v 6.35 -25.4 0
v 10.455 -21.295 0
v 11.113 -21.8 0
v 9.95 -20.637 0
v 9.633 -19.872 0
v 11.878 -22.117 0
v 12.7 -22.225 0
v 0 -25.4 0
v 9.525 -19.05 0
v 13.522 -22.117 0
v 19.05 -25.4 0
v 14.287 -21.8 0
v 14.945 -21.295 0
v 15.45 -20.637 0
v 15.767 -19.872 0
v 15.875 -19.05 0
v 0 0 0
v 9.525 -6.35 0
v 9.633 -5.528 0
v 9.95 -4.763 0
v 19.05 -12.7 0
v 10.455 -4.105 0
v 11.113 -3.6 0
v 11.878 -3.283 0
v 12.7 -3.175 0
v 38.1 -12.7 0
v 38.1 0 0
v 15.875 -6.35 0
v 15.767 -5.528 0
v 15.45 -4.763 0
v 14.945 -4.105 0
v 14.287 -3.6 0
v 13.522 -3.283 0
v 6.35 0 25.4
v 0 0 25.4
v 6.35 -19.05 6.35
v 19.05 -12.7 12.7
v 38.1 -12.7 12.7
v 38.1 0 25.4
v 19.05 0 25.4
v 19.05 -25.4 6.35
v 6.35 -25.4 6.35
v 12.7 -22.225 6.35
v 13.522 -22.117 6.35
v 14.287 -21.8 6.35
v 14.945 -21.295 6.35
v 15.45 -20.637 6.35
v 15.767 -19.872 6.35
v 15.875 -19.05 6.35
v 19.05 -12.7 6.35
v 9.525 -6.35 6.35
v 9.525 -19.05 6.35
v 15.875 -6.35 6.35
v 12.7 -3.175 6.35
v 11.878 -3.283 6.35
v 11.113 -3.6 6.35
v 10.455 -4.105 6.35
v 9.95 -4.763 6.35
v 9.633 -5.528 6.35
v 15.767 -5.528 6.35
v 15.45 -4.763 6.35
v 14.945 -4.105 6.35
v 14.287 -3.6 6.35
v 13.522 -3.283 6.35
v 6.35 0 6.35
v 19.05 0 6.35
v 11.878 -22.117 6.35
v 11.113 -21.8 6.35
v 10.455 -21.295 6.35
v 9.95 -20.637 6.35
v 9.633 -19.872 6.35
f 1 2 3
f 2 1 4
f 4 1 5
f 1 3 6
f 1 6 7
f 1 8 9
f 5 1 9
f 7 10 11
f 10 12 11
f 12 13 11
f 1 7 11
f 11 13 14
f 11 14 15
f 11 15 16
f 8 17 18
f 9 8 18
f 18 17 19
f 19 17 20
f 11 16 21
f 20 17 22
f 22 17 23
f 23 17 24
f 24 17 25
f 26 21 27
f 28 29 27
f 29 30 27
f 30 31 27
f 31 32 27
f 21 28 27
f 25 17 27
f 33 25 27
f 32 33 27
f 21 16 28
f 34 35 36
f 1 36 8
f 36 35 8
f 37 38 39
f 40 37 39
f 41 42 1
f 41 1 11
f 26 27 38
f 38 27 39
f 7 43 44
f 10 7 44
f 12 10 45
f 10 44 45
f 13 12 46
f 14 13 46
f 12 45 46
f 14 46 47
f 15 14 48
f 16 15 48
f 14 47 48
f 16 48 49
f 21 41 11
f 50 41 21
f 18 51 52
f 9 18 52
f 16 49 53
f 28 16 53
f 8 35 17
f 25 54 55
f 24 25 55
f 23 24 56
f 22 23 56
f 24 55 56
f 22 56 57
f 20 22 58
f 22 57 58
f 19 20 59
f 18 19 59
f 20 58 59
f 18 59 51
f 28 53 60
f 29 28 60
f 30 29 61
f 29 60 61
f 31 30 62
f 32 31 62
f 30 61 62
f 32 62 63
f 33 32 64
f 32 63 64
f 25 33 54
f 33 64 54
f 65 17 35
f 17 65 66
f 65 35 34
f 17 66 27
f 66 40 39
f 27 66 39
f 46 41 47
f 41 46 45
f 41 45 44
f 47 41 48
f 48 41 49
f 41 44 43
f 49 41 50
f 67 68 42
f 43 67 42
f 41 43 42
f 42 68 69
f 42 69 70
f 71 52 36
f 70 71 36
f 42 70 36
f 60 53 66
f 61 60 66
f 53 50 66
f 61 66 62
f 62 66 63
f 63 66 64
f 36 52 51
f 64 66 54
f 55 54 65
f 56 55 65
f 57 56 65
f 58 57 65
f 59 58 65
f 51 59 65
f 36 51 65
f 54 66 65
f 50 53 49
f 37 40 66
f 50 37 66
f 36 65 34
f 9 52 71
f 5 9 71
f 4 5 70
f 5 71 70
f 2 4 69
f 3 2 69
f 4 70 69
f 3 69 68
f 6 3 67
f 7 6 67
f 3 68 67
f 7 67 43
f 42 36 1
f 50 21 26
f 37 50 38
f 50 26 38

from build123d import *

# Parameters (mm, degrees)
F1_DEPTH = 25.4
F2_W     = 12.7
F2_H     = 25.4
F3_DEPTH = 19.05
F5_DEPTH = 19.05
F7_DEPTH = 6.35
F9_DEPTH = 25.4


with BuildPart() as f1:
    # F0 (on Front) → F1 (new body)
    with BuildSketch(Plane.XZ):
        Polygon((0, 25.4), (0, 0), (38.1, 0), (38.1, 25.4), (19.05, 25.4), (19.05, 6.35), (6.35, 6.35), (6.35, 25.4), align=None)
    extrude(amount=F1_DEPTH)

    # F2 (on face) → F3 (cut)
    with BuildSketch(Plane.YZ.offset(38.1)):
        with Locations((-19.05, 12.7)):
            Rectangle(F2_W, F2_H)
    extrude(amount=-F3_DEPTH, mode=Mode.SUBTRACT)

    # F4 (on face) → F5 (cut)
    with BuildSketch(Plane.YZ.offset(38.1)):
        Polygon((-12.7, 25.4), (-12.7, 12.7), (0, 25.4), align=None)
    extrude(amount=-F5_DEPTH, mode=Mode.SUBTRACT)

    # F6 (on face) → F7 (cut)
    with BuildSketch(Plane(origin=(0, 0, 0), x_dir=(0, -1, 0), z_dir=(-1, 0, 0))):
        Polygon((25.4, 25.4), (0, 25.4), (25.4, 0), align=None)
    extrude(amount=-F7_DEPTH, mode=Mode.SUBTRACT)

    # F8 (on face) → F9 (cut)
    with BuildSketch(Plane.XY.offset(6.35)):
        with BuildLine():
            ThreePointArc((12.7, -22.225), (14.945064, -21.295064), (15.875, -19.05))
            ThreePointArc((15.875, -19.05), (12.7, -15.875), (9.525, -19.05))
            ThreePointArc((9.525, -19.05), (10.454936, -21.295064), (12.7, -22.225))
        make_face()
        with BuildLine():
            ThreePointArc((9.525, -19.05), (12.7, -15.875), (15.875, -19.05))
            Line((15.875, -19.05), (15.875, -6.35))
            ThreePointArc((15.875, -6.35), (12.7, -9.525), (9.525, -6.35))
            Line((9.525, -6.35), (9.525, -19.05))
        make_face()
        with BuildLine():
            ThreePointArc((9.525, -6.35), (12.7, -9.525), (15.875, -6.35))
            ThreePointArc((15.875, -6.35), (14.945064, -4.104936), (12.7, -3.175))
            ThreePointArc((12.7, -3.175), (10.454936, -4.104936), (9.525, -6.35))
        make_face()
    extrude(amount=-F9_DEPTH, mode=Mode.SUBTRACT)


solid = f1.part
